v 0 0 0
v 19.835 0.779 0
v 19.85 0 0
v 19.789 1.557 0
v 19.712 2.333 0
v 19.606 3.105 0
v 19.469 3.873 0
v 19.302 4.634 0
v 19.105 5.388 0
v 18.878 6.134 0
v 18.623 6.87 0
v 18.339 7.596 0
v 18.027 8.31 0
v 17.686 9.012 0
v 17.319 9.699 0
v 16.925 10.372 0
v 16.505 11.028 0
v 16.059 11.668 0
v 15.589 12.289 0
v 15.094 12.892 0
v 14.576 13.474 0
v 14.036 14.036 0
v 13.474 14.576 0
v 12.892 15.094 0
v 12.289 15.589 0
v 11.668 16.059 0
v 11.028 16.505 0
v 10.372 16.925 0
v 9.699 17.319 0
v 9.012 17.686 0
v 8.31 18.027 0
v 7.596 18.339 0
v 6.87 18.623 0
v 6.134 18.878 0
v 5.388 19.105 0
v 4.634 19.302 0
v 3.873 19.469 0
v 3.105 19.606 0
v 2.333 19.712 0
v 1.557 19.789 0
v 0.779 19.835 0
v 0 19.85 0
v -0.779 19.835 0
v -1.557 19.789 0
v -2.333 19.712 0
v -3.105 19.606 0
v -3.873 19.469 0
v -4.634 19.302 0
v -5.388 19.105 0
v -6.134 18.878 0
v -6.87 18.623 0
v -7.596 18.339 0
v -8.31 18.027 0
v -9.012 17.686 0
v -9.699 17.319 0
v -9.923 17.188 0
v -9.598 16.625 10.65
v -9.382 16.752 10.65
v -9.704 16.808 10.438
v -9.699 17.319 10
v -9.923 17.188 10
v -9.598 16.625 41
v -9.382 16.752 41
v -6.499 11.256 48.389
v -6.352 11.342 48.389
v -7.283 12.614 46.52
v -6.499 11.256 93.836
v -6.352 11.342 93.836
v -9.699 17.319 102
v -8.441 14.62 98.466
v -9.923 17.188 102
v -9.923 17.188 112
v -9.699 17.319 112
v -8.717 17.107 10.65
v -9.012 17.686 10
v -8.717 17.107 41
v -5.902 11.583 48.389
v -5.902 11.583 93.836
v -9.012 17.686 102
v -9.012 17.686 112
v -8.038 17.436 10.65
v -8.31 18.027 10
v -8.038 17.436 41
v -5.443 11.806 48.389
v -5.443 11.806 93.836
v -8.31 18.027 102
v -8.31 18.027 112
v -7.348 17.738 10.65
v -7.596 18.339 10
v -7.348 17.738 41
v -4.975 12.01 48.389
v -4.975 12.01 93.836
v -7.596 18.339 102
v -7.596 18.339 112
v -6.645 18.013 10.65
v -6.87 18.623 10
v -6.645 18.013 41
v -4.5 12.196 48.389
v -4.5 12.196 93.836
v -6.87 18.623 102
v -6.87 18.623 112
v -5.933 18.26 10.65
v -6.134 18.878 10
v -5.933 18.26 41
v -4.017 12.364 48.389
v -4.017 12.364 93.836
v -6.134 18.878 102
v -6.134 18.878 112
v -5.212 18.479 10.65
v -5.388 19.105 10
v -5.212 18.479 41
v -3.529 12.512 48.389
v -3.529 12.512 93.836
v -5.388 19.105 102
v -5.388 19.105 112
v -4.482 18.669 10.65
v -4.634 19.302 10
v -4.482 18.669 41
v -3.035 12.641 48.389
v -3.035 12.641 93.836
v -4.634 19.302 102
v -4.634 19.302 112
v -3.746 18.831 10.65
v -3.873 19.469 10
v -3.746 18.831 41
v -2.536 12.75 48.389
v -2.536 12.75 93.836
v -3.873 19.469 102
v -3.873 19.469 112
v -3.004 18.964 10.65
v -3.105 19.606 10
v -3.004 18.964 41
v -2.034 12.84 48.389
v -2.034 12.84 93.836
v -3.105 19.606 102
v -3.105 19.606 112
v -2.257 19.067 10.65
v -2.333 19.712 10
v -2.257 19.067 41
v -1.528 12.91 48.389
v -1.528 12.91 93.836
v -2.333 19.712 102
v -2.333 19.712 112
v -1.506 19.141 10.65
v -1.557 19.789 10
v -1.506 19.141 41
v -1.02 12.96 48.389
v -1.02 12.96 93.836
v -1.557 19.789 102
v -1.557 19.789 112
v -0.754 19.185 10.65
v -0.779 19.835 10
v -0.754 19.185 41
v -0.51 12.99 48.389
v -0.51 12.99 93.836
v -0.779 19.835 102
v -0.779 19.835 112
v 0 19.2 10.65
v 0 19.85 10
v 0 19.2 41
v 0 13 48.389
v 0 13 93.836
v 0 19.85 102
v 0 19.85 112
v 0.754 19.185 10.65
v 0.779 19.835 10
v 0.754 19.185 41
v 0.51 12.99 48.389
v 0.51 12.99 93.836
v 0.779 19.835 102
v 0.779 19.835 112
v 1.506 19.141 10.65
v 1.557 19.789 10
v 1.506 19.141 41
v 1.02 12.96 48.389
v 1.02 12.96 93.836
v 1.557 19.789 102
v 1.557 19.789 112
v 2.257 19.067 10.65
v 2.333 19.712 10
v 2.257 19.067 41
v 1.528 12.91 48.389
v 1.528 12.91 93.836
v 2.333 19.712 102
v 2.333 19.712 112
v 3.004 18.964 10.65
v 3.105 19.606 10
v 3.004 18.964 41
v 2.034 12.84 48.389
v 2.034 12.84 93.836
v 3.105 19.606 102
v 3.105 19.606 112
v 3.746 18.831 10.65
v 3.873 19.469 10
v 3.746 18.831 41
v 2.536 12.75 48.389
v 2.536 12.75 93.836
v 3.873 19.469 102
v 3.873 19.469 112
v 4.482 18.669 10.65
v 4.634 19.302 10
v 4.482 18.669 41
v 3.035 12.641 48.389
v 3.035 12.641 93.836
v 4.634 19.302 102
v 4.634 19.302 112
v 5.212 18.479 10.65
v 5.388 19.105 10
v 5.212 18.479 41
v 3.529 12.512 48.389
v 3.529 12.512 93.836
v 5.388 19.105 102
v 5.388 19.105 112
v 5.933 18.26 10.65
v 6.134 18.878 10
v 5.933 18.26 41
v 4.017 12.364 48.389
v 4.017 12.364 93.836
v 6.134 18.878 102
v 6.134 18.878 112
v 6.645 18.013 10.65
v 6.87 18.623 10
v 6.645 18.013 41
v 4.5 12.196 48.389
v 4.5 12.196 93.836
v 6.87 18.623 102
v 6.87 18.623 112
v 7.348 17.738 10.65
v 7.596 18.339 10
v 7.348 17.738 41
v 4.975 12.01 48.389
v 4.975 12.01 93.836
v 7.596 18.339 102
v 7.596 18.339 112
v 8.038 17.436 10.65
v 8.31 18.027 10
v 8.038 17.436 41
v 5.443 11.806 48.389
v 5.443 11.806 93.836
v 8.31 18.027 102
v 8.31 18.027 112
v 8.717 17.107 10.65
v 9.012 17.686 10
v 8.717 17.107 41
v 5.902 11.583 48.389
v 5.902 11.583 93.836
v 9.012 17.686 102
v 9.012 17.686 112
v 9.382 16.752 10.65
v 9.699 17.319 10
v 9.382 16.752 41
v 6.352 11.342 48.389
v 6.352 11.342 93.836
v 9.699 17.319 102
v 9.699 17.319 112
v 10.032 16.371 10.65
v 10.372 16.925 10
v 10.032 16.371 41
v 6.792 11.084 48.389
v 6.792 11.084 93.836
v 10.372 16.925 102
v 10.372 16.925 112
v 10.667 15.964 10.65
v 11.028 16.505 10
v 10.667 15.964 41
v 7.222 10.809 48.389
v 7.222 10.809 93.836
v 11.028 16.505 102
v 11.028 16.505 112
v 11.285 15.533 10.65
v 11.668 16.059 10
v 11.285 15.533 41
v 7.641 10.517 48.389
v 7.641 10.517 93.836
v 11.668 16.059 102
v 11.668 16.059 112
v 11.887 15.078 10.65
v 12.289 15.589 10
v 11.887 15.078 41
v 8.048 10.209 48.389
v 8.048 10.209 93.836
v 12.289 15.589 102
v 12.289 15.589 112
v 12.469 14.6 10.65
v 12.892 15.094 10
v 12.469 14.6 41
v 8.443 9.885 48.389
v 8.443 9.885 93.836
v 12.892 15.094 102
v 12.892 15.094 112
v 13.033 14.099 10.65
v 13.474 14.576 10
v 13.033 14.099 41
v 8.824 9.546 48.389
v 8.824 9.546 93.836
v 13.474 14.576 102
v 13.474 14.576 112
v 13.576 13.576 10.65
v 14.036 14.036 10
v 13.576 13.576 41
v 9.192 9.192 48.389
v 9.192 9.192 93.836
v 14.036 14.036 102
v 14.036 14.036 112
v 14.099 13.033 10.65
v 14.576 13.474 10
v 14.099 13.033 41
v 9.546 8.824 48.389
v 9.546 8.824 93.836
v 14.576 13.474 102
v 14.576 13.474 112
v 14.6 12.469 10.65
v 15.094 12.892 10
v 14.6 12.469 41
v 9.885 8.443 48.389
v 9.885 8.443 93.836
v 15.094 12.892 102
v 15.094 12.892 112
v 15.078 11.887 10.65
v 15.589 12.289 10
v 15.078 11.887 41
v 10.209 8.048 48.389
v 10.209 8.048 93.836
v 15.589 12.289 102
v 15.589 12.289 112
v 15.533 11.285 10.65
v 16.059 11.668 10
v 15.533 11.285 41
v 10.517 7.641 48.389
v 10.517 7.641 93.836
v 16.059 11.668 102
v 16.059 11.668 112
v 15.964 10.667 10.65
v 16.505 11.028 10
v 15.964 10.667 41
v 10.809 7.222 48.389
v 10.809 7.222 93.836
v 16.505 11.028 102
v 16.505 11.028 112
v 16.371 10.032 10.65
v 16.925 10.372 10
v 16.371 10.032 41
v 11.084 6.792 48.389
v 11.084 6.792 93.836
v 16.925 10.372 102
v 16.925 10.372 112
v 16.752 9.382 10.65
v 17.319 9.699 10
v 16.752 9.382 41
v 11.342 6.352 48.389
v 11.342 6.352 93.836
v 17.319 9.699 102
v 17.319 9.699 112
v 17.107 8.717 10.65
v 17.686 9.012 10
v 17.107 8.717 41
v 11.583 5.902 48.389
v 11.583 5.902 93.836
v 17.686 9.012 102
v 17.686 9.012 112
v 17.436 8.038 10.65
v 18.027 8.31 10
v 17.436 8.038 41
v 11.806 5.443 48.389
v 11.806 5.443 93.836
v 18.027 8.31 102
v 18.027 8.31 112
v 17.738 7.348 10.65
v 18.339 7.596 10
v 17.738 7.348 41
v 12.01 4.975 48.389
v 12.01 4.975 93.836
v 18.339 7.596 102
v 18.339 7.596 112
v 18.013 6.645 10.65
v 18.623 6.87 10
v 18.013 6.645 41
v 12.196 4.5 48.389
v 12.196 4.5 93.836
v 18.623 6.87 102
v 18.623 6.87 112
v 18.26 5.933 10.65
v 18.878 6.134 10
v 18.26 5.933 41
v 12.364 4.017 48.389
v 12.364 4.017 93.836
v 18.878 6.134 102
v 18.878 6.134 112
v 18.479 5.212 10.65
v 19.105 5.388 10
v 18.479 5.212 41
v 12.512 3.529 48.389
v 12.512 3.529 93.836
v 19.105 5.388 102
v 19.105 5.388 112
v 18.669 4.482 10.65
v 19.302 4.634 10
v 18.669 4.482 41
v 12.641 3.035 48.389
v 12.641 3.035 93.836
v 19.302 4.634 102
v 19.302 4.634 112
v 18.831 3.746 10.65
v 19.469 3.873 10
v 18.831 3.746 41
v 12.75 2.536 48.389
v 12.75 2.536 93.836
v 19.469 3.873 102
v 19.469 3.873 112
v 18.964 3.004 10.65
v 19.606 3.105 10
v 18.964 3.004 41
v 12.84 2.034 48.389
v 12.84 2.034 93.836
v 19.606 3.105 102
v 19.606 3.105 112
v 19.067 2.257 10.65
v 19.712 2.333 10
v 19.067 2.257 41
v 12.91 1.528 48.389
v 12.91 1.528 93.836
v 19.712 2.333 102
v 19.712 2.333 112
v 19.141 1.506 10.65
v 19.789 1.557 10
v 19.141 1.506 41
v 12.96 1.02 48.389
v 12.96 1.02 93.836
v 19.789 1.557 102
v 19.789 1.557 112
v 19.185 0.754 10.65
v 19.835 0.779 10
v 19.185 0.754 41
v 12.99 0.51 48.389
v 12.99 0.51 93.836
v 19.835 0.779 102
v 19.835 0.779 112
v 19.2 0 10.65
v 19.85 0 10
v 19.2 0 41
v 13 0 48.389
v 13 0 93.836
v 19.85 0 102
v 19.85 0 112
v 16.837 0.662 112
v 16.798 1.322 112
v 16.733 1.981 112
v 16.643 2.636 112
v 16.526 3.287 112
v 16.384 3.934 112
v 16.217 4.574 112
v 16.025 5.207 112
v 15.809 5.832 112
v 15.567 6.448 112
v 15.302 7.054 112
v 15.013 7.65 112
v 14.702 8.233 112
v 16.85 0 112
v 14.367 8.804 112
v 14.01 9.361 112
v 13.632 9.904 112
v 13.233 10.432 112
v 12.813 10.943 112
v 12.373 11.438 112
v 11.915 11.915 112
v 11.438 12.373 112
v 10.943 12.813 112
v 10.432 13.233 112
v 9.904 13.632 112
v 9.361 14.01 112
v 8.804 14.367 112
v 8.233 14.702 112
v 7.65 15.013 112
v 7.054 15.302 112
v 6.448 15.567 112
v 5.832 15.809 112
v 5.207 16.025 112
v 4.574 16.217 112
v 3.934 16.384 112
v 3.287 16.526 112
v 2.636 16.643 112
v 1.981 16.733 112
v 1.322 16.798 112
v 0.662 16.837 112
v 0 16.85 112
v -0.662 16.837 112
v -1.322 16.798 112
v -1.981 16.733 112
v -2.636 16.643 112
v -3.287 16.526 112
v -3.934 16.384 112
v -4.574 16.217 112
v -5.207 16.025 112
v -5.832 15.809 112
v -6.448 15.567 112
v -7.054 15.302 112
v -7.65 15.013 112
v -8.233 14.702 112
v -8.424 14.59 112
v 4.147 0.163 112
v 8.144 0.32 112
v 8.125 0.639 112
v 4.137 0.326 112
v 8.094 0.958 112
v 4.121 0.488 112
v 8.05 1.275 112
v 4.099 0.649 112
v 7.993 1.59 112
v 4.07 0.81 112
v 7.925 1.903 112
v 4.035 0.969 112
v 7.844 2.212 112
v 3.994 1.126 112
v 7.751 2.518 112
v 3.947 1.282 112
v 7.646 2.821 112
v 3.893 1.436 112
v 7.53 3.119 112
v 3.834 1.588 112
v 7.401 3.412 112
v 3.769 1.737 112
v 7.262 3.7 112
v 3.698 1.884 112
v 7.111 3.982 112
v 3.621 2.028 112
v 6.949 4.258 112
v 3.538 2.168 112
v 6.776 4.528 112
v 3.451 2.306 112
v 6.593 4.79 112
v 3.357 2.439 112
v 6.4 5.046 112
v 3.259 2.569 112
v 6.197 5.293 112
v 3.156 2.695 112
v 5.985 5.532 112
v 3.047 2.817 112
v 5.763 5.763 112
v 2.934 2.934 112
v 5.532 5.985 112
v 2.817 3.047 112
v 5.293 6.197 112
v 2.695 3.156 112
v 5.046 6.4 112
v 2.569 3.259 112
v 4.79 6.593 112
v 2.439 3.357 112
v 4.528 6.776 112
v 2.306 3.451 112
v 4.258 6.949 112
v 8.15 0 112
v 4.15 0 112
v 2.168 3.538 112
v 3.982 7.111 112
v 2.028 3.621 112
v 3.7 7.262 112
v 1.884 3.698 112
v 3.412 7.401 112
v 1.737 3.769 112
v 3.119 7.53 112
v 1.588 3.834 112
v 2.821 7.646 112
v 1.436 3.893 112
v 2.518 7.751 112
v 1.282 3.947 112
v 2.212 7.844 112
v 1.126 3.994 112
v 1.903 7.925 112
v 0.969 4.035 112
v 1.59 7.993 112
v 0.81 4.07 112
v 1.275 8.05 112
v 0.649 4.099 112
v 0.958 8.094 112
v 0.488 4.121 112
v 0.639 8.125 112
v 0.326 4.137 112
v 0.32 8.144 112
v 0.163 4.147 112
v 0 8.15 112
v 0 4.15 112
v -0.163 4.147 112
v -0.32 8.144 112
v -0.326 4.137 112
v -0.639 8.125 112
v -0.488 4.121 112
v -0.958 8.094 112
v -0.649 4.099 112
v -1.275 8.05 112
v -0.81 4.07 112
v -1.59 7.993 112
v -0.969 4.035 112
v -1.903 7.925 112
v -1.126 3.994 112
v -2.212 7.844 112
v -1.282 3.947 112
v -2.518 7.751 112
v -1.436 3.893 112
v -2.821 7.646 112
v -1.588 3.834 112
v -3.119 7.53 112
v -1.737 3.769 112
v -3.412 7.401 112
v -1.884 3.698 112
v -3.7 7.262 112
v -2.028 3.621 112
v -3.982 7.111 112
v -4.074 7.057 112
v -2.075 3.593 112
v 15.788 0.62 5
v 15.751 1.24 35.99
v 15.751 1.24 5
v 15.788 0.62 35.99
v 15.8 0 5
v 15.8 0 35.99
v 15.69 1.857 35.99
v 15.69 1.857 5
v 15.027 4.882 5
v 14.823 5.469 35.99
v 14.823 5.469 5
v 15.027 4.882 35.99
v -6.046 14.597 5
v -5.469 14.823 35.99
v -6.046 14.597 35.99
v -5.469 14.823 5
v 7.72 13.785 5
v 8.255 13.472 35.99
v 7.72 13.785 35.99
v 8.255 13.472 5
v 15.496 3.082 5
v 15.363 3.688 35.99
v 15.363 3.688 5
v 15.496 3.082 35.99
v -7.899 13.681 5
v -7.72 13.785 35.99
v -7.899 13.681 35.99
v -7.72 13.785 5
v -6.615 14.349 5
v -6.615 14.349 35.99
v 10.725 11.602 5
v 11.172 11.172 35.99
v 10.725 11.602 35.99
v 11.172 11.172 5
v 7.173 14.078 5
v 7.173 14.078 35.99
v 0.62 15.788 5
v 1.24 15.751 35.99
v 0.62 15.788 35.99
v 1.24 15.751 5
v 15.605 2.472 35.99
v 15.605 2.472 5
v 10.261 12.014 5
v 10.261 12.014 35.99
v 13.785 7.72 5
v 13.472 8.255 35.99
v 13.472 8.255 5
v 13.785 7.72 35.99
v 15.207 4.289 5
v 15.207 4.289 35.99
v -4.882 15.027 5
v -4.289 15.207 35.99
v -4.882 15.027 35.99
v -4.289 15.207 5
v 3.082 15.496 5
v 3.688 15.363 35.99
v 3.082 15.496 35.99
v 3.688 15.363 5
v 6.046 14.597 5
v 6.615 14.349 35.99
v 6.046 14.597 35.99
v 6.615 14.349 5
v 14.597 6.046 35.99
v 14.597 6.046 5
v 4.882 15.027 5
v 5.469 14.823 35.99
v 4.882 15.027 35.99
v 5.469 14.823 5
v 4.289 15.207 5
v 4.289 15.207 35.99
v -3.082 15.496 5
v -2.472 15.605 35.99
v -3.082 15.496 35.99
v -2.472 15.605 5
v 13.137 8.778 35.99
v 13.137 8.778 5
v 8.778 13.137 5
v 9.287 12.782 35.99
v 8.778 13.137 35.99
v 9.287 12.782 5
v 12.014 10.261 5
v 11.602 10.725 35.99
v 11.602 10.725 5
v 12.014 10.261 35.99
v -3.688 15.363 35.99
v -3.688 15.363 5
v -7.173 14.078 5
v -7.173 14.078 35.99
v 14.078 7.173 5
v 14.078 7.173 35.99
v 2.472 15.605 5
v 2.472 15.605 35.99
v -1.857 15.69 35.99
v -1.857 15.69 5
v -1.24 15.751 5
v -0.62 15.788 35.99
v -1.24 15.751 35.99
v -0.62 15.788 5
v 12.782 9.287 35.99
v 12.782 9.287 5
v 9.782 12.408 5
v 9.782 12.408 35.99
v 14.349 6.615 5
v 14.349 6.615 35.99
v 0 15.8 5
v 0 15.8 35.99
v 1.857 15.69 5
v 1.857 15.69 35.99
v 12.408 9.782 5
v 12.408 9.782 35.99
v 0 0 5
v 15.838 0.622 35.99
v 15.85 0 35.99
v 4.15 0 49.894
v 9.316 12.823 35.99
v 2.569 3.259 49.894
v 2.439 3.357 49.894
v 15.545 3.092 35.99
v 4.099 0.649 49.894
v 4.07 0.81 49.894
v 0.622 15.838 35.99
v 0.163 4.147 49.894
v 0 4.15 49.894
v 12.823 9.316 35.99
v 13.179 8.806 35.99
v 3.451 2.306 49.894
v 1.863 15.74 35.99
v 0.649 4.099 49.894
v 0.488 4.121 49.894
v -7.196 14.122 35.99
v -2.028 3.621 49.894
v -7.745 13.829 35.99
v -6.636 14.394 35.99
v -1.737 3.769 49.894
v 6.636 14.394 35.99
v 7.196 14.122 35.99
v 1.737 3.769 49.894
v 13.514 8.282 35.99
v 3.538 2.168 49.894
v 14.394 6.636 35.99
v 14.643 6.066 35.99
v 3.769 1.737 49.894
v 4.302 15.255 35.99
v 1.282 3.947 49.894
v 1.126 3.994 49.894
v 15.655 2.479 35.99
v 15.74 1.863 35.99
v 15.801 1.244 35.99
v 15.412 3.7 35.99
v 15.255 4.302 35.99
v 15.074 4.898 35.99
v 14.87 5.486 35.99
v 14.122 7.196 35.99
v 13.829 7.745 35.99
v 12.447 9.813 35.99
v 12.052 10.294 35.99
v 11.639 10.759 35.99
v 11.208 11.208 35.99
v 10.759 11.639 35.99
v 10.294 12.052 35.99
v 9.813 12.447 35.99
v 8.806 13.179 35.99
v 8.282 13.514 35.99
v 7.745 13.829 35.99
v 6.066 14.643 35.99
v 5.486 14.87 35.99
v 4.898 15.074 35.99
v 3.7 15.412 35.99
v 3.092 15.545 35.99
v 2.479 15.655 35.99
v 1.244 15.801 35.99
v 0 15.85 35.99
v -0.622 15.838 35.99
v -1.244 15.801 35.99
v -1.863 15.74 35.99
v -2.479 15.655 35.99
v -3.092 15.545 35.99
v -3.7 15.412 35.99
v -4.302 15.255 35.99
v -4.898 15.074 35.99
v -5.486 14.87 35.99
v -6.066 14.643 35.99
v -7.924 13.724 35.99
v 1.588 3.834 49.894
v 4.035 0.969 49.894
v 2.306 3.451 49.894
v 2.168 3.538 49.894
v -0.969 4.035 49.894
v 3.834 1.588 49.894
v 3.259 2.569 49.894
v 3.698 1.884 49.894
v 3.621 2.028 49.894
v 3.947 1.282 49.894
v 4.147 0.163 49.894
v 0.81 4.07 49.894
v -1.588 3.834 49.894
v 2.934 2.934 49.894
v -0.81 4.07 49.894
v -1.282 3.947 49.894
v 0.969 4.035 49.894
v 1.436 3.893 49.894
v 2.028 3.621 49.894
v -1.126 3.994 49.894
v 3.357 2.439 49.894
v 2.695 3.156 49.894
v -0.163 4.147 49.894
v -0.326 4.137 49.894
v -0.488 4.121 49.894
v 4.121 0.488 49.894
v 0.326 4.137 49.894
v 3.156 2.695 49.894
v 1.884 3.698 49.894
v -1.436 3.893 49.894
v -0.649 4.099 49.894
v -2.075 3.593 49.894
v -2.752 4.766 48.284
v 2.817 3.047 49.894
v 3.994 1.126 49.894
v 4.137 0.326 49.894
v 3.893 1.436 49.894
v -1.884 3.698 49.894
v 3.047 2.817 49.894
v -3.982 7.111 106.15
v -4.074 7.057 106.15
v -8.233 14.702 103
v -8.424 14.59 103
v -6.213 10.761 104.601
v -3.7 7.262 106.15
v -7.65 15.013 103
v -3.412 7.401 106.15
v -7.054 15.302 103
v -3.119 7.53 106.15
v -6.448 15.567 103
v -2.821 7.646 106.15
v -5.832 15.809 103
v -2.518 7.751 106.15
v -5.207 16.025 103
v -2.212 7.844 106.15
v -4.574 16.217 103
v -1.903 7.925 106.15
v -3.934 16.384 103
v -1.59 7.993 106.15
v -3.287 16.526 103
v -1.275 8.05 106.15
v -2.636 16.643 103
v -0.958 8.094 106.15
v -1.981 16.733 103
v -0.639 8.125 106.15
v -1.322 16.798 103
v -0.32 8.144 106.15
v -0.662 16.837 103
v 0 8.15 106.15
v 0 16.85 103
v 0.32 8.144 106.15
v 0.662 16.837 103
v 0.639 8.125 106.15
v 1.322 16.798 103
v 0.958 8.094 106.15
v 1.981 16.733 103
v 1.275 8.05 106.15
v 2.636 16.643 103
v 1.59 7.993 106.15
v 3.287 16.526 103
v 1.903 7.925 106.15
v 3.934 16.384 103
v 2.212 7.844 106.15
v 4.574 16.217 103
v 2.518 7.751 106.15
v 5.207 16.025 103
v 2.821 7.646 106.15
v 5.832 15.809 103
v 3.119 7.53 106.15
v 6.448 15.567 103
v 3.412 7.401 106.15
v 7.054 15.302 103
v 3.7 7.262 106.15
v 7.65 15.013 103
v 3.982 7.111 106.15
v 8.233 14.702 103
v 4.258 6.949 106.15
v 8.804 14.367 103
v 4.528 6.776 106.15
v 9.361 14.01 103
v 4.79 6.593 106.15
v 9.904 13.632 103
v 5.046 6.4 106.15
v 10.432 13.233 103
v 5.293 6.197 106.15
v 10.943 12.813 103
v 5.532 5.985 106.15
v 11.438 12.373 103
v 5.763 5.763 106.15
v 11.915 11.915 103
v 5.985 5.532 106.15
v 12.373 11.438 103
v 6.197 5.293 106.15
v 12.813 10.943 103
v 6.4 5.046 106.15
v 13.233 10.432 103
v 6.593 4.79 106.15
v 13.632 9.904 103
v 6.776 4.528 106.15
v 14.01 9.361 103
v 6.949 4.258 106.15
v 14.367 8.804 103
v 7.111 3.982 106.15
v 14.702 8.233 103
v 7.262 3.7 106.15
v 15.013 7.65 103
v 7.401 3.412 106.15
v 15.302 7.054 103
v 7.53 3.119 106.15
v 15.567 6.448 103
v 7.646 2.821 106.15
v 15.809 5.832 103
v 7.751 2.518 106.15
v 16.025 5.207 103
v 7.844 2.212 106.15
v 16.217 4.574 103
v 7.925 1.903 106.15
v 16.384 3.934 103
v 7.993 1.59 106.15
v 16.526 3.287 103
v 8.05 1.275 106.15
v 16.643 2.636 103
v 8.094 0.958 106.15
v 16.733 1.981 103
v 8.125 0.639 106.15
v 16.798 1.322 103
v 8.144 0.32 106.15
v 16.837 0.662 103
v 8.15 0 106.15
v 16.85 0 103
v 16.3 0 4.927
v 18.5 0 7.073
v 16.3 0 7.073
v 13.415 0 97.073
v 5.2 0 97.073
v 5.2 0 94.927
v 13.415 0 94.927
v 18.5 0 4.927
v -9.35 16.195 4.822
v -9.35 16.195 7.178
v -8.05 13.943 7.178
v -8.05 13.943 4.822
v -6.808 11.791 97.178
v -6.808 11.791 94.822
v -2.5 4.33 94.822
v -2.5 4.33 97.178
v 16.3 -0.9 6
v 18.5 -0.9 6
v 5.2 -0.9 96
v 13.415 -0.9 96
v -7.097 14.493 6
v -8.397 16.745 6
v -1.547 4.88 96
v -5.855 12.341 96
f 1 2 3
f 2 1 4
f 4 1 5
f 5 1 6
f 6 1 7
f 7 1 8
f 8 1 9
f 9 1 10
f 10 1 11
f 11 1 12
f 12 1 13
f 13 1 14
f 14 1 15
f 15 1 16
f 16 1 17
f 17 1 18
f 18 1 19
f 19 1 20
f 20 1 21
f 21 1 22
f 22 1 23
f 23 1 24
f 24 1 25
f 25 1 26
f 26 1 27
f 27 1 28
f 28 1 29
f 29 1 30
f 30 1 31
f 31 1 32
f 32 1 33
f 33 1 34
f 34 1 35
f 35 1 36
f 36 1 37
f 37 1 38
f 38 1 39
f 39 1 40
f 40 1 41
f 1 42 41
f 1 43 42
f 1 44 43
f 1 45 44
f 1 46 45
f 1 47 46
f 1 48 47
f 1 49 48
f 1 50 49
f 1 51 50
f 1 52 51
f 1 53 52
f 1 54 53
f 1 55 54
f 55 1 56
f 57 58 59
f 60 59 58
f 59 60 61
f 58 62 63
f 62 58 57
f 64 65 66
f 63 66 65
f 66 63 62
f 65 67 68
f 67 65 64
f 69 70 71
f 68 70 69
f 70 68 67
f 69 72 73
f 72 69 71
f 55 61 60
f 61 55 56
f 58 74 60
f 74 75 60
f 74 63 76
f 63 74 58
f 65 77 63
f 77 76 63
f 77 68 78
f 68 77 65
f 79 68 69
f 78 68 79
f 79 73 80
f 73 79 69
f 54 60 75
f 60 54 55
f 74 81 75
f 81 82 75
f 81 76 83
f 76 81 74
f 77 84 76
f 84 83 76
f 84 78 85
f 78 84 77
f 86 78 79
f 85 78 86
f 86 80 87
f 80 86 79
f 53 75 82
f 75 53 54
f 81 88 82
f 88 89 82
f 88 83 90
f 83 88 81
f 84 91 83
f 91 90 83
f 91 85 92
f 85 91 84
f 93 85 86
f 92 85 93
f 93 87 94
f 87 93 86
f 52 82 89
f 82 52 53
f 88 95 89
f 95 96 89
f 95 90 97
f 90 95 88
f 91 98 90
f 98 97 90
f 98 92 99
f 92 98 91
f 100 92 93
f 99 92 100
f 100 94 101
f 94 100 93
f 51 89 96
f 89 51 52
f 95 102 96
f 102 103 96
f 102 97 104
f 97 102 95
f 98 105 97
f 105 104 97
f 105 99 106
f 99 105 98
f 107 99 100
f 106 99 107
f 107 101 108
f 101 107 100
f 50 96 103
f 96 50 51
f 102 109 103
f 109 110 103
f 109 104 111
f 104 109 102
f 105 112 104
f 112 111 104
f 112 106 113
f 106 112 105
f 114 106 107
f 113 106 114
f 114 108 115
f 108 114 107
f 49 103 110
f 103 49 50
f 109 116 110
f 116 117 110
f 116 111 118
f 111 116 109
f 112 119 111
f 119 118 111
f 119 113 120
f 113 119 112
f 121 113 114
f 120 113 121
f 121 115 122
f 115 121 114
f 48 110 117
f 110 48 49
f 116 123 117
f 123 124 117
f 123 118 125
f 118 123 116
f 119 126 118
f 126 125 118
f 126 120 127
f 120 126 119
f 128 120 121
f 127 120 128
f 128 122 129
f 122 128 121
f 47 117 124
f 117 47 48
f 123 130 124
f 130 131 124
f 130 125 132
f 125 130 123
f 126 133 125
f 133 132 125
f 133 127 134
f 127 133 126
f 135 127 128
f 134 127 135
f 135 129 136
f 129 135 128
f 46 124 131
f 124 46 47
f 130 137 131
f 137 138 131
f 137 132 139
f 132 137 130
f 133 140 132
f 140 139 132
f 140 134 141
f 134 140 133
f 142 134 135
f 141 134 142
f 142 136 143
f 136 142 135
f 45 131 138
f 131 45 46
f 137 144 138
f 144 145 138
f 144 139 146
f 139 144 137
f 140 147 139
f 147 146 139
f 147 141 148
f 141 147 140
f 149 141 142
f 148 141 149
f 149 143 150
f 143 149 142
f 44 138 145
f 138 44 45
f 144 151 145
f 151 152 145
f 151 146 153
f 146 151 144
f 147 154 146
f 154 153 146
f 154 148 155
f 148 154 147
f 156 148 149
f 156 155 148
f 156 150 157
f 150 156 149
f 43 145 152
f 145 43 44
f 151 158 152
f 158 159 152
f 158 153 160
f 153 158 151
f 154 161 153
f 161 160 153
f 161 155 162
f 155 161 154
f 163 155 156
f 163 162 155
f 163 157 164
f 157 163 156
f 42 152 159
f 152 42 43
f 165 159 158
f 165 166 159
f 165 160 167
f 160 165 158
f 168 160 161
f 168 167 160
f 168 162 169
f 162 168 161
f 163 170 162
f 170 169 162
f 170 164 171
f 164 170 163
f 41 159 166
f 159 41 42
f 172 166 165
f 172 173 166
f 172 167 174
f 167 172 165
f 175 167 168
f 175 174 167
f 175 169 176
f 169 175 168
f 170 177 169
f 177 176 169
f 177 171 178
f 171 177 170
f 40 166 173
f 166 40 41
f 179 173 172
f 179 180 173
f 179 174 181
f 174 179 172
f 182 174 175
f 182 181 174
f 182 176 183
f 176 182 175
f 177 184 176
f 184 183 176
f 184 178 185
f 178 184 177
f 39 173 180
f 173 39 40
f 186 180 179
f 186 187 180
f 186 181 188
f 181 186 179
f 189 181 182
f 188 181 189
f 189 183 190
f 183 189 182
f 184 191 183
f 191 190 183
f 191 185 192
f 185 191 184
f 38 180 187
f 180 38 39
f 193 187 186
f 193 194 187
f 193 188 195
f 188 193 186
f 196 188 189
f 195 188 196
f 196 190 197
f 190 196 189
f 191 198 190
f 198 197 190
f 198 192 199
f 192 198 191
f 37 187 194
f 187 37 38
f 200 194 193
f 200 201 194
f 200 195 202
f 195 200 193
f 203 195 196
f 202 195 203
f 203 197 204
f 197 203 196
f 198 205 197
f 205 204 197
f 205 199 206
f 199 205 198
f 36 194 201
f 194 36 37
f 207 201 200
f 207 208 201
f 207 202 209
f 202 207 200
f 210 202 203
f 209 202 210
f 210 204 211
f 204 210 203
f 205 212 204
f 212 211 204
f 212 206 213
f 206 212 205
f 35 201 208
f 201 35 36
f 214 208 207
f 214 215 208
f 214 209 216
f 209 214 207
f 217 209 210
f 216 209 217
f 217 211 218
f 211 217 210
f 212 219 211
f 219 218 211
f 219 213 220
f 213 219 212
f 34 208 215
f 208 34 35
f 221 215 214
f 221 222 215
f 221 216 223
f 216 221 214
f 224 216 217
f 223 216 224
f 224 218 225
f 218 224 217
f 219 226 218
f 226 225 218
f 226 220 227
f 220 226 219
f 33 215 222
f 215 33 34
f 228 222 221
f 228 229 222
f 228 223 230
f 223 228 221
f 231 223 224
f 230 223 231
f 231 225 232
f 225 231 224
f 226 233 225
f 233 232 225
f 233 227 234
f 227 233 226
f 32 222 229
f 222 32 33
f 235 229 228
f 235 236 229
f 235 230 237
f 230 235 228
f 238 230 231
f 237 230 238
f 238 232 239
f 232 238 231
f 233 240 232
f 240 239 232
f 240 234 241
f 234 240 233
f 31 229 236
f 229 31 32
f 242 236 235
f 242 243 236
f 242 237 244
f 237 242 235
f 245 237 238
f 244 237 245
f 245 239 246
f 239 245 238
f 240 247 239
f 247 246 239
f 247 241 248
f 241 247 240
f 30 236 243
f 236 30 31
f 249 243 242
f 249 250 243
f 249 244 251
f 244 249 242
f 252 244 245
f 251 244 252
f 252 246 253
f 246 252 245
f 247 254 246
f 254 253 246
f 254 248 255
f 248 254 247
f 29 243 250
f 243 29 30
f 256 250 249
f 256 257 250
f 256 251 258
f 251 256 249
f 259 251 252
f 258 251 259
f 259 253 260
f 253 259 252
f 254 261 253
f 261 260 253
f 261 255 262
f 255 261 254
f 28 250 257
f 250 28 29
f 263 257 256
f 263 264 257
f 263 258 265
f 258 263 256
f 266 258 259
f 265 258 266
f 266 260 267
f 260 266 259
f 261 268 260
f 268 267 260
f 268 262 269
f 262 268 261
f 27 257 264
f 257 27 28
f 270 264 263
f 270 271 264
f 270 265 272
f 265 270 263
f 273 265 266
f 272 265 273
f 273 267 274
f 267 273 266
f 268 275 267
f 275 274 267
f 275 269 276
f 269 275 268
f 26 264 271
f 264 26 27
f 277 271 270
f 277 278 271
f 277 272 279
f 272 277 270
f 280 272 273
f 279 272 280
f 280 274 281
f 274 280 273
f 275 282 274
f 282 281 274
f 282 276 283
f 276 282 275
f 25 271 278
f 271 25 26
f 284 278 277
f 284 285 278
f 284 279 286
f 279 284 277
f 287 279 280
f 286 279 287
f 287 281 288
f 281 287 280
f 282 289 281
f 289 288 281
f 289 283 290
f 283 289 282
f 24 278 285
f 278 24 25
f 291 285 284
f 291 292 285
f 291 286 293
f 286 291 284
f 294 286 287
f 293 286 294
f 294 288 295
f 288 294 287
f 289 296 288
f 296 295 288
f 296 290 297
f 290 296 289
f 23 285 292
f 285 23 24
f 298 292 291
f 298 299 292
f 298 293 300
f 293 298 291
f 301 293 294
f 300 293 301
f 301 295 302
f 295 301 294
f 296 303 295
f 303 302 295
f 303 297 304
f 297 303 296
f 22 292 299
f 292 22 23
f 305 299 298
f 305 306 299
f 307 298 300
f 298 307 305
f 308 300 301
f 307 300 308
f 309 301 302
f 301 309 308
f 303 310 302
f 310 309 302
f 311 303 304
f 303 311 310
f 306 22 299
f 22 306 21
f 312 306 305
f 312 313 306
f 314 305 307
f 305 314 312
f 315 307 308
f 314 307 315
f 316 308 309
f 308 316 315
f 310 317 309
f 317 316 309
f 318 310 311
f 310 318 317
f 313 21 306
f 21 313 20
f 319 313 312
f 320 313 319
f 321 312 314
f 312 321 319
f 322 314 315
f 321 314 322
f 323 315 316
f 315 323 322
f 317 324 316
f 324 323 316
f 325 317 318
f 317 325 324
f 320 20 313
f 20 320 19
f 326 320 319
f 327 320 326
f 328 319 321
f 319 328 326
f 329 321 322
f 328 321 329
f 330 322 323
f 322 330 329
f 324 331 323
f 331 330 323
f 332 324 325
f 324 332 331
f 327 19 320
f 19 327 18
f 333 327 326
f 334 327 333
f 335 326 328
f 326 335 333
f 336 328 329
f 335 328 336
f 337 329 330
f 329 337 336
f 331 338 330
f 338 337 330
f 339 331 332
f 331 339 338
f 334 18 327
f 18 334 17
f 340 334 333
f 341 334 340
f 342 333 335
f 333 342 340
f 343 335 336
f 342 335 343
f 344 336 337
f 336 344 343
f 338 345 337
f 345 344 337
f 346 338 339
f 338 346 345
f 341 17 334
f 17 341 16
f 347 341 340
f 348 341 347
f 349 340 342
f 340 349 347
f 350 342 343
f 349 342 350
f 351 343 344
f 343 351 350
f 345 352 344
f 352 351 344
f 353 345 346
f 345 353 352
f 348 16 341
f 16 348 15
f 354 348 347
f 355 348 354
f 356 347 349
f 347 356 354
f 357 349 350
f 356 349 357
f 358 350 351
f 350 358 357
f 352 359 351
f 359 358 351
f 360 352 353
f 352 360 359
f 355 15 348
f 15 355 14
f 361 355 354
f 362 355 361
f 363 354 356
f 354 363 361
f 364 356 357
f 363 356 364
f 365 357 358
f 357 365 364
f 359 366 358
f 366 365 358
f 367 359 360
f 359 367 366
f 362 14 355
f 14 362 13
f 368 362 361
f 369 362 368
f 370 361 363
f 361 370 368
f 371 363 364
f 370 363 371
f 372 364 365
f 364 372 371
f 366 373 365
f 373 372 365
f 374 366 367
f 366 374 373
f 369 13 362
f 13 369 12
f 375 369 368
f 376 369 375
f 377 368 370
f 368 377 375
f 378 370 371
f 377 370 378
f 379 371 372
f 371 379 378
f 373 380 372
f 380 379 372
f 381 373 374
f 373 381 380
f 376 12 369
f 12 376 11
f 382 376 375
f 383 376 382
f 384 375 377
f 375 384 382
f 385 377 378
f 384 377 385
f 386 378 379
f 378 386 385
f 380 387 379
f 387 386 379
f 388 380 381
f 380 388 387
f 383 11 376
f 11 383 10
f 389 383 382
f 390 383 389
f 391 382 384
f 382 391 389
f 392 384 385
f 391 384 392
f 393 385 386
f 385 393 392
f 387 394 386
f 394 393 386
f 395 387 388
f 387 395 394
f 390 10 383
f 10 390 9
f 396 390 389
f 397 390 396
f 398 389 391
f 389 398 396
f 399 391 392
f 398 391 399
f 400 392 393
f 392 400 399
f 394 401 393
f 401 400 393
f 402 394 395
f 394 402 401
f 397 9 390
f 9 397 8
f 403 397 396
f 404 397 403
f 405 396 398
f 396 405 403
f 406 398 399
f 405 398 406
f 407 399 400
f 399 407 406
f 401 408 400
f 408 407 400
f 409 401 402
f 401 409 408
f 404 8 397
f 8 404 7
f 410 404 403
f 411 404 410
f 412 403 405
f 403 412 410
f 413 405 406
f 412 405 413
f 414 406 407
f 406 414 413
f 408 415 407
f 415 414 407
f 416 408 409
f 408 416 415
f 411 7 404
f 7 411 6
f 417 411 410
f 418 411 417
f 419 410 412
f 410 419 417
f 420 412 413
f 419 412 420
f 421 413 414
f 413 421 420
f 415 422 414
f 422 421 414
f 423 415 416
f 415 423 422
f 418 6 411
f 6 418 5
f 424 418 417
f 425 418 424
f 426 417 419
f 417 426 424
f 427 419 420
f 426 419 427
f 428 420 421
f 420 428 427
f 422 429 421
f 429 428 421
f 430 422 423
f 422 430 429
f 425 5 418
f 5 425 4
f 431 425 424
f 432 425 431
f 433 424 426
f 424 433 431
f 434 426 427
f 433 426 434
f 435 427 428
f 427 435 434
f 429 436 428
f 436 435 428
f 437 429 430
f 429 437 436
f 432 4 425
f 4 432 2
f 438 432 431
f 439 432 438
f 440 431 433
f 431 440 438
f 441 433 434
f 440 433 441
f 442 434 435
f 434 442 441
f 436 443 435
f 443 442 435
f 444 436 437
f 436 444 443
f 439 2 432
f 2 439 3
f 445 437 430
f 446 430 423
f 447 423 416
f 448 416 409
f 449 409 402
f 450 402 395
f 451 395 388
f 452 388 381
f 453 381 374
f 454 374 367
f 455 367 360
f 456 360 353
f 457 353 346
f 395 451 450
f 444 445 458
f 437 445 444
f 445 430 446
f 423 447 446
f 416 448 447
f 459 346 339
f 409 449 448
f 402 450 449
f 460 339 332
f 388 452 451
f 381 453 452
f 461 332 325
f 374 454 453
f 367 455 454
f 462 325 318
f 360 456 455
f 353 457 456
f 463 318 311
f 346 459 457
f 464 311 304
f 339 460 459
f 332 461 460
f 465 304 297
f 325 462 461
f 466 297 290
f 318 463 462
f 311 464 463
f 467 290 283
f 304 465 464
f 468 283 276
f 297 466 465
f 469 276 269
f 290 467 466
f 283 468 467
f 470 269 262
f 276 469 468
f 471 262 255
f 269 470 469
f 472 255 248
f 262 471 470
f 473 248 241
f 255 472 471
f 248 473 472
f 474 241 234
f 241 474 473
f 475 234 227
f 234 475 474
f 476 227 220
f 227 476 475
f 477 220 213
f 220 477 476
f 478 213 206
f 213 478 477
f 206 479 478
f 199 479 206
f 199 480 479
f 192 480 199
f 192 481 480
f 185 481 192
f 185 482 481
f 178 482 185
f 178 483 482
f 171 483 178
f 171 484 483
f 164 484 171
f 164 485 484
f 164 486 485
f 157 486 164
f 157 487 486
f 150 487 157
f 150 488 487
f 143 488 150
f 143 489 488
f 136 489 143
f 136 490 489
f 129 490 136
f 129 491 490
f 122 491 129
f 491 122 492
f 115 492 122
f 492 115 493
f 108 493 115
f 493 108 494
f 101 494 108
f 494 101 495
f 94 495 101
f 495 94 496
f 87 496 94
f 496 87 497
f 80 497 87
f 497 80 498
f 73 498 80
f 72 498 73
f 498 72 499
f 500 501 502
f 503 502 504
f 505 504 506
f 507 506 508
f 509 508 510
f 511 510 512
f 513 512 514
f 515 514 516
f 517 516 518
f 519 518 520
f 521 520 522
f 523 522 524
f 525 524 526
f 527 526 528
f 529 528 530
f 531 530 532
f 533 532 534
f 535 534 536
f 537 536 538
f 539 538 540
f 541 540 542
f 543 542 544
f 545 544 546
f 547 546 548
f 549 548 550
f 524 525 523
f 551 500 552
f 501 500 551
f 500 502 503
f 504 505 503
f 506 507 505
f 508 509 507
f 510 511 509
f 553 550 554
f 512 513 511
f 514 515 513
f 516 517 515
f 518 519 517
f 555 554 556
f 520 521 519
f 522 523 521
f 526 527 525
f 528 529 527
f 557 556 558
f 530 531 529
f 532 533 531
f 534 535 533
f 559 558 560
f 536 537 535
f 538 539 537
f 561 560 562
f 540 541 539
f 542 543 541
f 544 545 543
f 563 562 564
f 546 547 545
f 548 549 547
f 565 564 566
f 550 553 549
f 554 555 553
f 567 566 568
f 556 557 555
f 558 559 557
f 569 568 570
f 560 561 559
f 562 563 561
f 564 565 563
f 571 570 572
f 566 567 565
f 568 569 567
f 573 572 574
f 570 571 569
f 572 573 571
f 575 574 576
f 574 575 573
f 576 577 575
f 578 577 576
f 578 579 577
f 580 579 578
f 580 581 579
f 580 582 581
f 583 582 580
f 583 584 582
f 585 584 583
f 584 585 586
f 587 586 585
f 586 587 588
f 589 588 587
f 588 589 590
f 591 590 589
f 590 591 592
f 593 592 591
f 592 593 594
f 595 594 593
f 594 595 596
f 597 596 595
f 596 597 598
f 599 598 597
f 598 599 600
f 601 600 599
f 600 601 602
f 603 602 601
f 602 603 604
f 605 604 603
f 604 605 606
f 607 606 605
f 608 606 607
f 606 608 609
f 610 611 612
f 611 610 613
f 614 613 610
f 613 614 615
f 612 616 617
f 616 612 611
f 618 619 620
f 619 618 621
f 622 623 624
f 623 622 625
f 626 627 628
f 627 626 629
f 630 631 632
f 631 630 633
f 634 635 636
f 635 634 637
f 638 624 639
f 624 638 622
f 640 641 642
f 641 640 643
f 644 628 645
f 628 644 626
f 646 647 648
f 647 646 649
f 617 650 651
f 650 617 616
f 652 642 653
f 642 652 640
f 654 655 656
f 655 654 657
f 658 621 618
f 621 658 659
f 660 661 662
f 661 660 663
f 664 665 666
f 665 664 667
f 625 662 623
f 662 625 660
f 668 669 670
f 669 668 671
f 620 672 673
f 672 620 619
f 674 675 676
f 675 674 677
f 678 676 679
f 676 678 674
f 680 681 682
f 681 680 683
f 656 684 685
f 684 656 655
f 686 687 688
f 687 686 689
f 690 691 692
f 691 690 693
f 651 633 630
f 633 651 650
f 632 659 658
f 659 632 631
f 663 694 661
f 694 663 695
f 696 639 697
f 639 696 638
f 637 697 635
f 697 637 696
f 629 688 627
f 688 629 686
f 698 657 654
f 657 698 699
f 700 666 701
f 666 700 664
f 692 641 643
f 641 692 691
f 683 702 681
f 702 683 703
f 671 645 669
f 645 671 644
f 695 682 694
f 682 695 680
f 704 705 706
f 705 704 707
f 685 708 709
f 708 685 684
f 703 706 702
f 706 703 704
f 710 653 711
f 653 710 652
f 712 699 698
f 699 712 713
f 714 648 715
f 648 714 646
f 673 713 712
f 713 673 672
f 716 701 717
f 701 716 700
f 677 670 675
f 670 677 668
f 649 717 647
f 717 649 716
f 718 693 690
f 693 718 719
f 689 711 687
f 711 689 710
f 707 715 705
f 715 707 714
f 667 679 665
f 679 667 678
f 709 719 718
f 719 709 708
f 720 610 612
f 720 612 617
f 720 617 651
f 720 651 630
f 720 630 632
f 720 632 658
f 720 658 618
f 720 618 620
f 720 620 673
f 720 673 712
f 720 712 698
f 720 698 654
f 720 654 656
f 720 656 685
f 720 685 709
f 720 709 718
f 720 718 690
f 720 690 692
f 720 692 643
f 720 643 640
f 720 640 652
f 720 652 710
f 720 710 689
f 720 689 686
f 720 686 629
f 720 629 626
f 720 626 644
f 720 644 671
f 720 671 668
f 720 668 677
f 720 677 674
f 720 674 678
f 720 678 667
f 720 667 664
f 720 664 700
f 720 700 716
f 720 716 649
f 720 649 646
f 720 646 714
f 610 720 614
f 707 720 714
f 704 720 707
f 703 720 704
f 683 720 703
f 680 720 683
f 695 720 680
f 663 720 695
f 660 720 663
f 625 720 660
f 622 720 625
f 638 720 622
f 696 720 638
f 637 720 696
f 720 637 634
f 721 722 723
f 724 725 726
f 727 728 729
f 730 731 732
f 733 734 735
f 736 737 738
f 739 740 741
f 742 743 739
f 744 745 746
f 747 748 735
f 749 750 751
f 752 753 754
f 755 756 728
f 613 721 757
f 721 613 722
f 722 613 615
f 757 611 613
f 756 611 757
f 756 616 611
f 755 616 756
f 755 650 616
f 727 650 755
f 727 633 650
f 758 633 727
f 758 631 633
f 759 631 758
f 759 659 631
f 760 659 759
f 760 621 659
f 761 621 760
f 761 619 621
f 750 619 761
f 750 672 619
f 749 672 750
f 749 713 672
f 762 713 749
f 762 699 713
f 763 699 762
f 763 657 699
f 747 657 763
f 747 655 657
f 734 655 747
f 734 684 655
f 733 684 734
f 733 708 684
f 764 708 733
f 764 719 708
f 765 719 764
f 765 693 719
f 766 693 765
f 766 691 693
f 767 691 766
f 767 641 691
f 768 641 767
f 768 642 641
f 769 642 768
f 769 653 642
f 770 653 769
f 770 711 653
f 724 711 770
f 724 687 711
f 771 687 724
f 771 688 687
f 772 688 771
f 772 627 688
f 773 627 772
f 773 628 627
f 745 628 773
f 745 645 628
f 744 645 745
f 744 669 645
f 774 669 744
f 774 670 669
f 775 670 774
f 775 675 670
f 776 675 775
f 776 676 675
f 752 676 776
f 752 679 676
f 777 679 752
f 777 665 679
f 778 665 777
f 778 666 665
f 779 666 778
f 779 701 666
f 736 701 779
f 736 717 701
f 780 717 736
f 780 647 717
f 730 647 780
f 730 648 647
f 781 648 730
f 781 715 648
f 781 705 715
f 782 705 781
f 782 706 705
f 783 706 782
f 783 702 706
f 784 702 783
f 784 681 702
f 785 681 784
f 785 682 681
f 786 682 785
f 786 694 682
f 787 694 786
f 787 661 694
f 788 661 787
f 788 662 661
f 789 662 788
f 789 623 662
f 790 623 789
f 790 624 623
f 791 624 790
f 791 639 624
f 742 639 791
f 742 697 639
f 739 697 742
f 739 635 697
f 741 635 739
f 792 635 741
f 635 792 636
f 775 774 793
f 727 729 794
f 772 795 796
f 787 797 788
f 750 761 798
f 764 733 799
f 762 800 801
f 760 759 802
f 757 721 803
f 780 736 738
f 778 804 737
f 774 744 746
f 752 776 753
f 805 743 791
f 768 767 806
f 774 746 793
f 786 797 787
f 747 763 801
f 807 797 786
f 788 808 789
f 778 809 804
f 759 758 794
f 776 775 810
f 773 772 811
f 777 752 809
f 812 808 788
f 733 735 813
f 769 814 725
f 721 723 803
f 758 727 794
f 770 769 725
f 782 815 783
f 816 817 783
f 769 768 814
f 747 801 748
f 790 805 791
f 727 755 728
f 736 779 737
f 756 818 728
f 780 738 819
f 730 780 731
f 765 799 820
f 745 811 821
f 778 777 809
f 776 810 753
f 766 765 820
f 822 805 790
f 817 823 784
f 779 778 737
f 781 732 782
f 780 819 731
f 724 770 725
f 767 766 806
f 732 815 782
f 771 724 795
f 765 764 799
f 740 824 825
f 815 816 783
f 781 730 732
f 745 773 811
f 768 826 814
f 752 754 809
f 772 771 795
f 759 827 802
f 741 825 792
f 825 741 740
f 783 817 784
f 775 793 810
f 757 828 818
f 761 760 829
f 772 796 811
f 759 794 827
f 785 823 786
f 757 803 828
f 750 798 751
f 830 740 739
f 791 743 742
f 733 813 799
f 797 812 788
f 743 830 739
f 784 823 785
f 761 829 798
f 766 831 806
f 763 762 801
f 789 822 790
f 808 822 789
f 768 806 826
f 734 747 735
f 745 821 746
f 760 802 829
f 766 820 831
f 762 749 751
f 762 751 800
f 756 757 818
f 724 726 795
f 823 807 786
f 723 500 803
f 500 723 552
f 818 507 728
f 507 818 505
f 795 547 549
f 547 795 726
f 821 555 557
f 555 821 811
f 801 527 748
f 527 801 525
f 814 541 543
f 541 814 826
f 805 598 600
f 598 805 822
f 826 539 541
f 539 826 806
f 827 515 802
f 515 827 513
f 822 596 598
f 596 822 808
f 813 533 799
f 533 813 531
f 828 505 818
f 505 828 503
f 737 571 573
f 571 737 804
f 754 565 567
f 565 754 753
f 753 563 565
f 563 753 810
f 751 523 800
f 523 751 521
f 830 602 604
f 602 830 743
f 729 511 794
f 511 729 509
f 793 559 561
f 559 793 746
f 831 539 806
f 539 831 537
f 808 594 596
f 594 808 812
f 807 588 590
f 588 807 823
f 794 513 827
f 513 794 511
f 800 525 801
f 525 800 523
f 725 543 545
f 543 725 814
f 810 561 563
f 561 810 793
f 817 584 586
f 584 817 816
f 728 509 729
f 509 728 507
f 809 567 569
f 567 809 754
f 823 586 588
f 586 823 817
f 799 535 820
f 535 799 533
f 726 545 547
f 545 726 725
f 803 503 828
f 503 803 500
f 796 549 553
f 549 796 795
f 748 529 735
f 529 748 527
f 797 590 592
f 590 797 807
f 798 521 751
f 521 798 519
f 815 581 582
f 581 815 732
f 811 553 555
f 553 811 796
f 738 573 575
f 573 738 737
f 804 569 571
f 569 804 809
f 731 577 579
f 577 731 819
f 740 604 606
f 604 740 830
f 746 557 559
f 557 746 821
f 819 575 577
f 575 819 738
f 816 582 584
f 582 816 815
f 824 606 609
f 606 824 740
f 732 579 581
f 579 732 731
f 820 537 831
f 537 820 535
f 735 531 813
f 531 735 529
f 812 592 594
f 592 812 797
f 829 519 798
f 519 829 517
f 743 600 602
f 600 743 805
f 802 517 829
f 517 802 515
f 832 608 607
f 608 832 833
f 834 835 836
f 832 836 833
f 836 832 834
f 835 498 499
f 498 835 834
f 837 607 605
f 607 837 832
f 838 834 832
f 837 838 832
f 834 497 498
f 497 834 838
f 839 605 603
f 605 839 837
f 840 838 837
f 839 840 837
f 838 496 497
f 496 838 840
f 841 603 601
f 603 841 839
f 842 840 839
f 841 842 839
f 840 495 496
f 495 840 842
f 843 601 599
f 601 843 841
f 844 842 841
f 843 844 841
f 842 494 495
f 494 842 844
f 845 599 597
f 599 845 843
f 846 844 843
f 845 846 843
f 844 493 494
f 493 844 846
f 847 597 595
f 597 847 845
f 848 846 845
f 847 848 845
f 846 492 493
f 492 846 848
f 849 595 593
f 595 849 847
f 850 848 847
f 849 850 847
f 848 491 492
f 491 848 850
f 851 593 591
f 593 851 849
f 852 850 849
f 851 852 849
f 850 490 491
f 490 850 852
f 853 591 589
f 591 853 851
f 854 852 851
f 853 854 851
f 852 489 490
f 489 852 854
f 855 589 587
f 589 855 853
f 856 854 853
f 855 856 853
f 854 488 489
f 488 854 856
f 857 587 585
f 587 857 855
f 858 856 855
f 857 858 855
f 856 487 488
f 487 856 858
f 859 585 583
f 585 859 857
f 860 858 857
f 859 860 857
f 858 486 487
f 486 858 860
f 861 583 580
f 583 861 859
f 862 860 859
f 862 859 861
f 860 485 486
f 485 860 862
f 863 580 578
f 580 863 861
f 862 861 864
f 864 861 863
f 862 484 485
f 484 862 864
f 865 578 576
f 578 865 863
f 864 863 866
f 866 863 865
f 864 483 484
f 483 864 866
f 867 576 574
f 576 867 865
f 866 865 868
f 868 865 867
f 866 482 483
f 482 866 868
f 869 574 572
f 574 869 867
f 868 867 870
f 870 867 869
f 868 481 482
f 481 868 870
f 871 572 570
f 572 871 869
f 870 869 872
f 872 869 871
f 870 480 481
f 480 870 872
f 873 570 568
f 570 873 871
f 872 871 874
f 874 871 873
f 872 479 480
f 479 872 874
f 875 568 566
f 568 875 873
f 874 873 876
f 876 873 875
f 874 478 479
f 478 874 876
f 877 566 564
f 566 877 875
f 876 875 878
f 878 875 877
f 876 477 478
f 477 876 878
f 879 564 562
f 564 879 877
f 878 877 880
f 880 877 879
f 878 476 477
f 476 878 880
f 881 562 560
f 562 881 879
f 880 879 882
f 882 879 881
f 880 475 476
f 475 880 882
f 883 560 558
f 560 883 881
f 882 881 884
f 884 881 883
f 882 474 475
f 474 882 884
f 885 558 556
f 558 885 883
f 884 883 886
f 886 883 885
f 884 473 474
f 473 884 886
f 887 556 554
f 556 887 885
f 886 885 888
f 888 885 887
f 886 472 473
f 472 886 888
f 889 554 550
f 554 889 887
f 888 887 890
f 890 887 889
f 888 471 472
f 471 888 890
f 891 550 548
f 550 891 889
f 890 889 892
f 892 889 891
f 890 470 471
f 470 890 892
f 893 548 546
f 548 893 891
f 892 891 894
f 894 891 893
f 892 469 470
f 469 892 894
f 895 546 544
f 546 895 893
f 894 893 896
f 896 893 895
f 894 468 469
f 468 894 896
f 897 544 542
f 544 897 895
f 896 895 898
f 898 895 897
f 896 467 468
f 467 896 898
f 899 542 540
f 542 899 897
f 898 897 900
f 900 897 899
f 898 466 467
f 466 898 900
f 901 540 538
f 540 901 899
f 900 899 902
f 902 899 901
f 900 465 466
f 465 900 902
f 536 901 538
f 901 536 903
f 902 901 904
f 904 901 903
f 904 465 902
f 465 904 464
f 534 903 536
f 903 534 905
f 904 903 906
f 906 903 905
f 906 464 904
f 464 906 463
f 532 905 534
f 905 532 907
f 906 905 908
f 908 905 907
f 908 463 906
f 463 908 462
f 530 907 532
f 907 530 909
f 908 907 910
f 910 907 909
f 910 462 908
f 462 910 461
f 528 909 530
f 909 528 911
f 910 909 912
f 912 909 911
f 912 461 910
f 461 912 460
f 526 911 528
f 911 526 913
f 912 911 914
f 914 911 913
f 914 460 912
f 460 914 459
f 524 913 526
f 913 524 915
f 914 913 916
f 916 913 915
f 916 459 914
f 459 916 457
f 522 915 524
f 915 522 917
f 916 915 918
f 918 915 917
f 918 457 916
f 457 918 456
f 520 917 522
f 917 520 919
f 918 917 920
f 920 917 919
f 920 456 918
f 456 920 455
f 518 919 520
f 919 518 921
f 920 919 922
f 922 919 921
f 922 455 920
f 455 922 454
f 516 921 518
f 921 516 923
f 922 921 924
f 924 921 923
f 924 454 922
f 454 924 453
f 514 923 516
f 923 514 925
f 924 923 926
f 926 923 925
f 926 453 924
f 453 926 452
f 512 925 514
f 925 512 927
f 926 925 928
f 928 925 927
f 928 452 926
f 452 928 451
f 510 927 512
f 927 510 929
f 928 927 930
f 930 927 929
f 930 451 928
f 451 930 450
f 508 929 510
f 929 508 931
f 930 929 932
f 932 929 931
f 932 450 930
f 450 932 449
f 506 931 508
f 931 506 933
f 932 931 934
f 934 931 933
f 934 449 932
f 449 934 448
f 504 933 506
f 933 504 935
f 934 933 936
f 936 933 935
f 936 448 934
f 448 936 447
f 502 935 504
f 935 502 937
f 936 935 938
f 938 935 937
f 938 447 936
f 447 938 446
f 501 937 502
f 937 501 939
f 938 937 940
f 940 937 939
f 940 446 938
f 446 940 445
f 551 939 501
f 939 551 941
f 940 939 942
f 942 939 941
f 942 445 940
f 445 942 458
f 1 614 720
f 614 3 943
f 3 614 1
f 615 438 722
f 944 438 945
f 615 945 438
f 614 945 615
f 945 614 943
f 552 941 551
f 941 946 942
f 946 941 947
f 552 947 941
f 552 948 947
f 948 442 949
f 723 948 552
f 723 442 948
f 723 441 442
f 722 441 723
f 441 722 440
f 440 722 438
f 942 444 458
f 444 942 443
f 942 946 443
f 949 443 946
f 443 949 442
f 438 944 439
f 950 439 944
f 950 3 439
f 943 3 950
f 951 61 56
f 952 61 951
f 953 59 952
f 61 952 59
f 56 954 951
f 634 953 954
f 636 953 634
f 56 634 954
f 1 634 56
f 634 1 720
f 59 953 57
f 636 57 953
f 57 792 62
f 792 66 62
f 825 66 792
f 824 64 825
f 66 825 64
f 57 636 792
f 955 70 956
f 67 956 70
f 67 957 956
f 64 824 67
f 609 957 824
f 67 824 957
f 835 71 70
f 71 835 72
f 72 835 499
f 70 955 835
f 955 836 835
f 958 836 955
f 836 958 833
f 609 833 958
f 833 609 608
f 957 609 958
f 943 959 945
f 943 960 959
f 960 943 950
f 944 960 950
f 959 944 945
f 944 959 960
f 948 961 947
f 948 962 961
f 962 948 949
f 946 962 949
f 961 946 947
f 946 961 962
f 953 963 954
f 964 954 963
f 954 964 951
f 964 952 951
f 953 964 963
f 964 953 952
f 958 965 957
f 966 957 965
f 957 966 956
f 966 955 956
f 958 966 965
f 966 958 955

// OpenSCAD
// file: flechette_dims.scad
// Shared flechette dimensions, used by flechette_parts.scad and sabot.scad.
// Every rod-carrying design comes in two rod sizes (Russ's rule):
//   rod_d = 8     8 mm hardened linear rod, or 5/16 in. (7.94 mm) Home Depot
//                 plain steel rod: both fit the same parts
//   rod_d = 12.7  1/2 in. rod (Home Depot plain steel, or a 1/2 in. linear shaft).
//                 A metric 12 mm rod would be loose in these: rebuild with rod_d = 12.
// Build either size with:  openscad -D rod_d=12.7 ...
// The 8 mm numbers are unchanged from the first design.

rod_d       = 8.0;
big         = rod_d > 10;
rod_len     = 150.0;

// push-on sockets (rev 2, no crush ribs: Russ found PCTG ribs don't crush, so
// the tails wouldn't go on, while the noses were a bit loose):
//   a plain round grip section, 12-14 mm long, sized for a snug press fit,
//   a slightly looser bore elsewhere, and a lead-in chamfer at the tail mouth.
// grip_d is the number to tune: use the socket fit gauge (socket_fit_gauge.scad)
// to find the hole that feels right on your rods, then set grip_fit to it.
sock_d      = rod_d + 0.2;          // reference size for the hub wall
grip_fit    = 0.00;                 // grip bore = rod + this. Russ's fit gauge: the +0.00 hole fit best (8 mm rod)
grip_d      = rod_d + grip_fit;
clear_d     = rod_d + 0.25;         // non-gripping parts of the bore: slides freely
grip_len    = 12.0;                 // tail: gripping length at the mouth
lead_in     = 0.6;                  // 45 deg chamfer at the tail mouth
wall        = big ? 2.0 : 1.7;      // socket wall (thicker for the 3x heavier rod)
hub_d       = sock_d + 2 * wall;    // 11.6 / 16.9 mm

// noses
nose_sock   = big ? 18.0 : 14.0;    // socket depth
spike_len   = big ? 40.0 : 30.0;    // shaped tip length above the sleeve
ogive_len   = big ? 26.0 : 18.0;    // rev 2: shorter, more bullet-shaped (about 1.5 hub diameters; was 32 / 24)
ogive_tip_r = big ? 3.4 : 2.4;      // rev 2: rounder tip, ~40% of the hub radius (was 2.3 / 1.6)
nose_gap    = 12.7;                 // rod end sits this far below the nose tip (Russ: about 1/2 in.),
                                    // unless that would leave less than 1.5 mm of wall (the 1/2 in. rod)
nose_taper  = big ? 18.0 : 20.0;    // tapered tail behind the sleeve, down toward the rod (1/2 in.: sabot clearance limits it)
taper_end_r = sock_d / 2 + 1.0;     // 1 mm wall at the taper's end (no feather edge)

// tails
tail_sock   = big ? 30.0 : 26.0;
tail_floor  = 3.0;
fin_n       = big ? 6 : 4;          // 1/2 in. rod needs 6 fins to stay stable (span is capped by the sabot)
fin_span    = 30.0;                 // tip to tip, fits the sabot cavity
fin_t       = 1.8;
fin_root    = big ? 36.0 : 30.0;
fin_tip     = big ? 16.0 : 13.0;
fin_cant    = 2.0;
basket_d    = 30.0;
basket_len  = 30.0;
basket_wall = 1.6;
windows     = 8;
window_h    = 11.8;                 // diamond height (pointed top prints without supports)
window_w    = 4.5;                  // diamond width: leaves ~3 mm bridges between windows (was 7.35, ~0.1 mm)
basket_twist = 16;

// overall tail length (sabot cavity must hold it)
tail_len    = max(tail_floor + tail_sock, fin_root, basket_len);

T50 = tan(50);
// main file
// Sabot for the 150 mm steel flechette (rod + printed nose + tail), 8 mm or
// 1/2 in. rod: set rod_d (see flechette_dims.scad), e.g. -D rod_d=12.7.
//
// Three identical petals close around the flechette and fill the 38 mm
// barrel. Air pushes the base; the base pushes the tail; the tail's floor
// pushes the rod. At the muzzle the petals fall away and the flechette
// flies on alone.
//
// Shape (after the military sabots Russ found):
//   - rear band: full 38 mm, rides and seals in the barrel (touch point 1)
//   - hollow rear cavity that holds the tail fins (30 mm span)
//   - slim waist (saves weight: every gram of sabot is wasted energy)
//   - front band: full 38 mm (touch point 2, ~95 mm from the rear band)
//   - front scoop: an open ring-shaped cup. Leaving the muzzle, oncoming air
//     fills it and pushes the three petals outward and back, evenly, so the
//     flechette isn't knocked off line.
// Alignment keys: each petal has a V ridge on one side face that drops into
// a V groove on its neighbor (one near the rear band, one at the front
// flare). The ridges run outward from the centre, so they stop the petals
// sliding lengthwise or twisting against each other but let them pull
// straight apart at the muzzle. Their faces slope 50 deg, so they print fine.
// The barrel holds the petals together while firing. To load, pinch them
// around the rod at the waist; once the first band is in, the barrel holds them. Fire it with a wad behind it to seal
// the petal seams.
//
// Print 3 petals (part = "petal"), each standing on its rear face, supports
// off, 100% infill or 6+ walls. Every downward face is >= 50 deg.

$fn = 160;

part        = "petal";      // "petal", "all" (3 petals, closed), "assembly", "open"
// The two bearing bands are sized to Russ's barrel (about 39 mm inside), not
// the 38.0 mm projectile limit, so the barrel squeezes the petals closed and
// centered. Only the bands touch the barrel; Russ approved this exception.
band_d      = 39.7;         // Russ: barrel measured ~40.1 mm inside (caliper); petals close to 39.7 mm
max_width   = 40.0;
D           = band_d;
n_petals    = 3;

include <flechette_dims.scad>     // rod size (rod_d) and tail/nose sizes, shared with the parts

// sabot
base_t      = 5.0;          // base the tail sits on (thick: it takes the air blast and the tail's push)
rear_band   = 10.0;         // length of the rear bearing band
fin_clr     = 0.8;          // clearance around the fins
bore_clr    = 0.15;         // rod bore clearance (rod slides out freely)
cav_wall    = 3.4;          // wall around the tail cavity (rev 3: was 2.4, Russ snapped one bending it)
// Rev 2 (Russ's first print snapped every petal at the bottom of the waist
// at ~90%: each petal's waist was a 3.35 mm sliver, down to ~1.6 mm where it
// met the cavity roof, standing 112 mm tall). Now a thick waist.
waist_r     = max(13.0, rod_d / 2 + bore_clr + 7.0);   // 13.0 (8 mm rod) / 13.5 (1/2 in.)
front_top   = 112.0;        // front end of the sabot (rod's front 40+ mm and nose stick out)
front_band  = 10.0;
scoop_depth = 9.0;
scoop_in_r  = rod_d / 2 + bore_clr + 4.0;    // collar around the rod (8.15 / 10.5)
scoop_wall  = 3.0;
key_d       = 0.9;          // how far a ridge sticks out of the face
key_h       = key_d * tan(50);   // half-height (faces at 50 deg)
key_clr     = 0.2;
assert(D <= max_width);
R  = D / 2;
fc_r   = fin_span / 2 + fin_clr;                 // fin cavity radius
cav_top = base_t + tail_len + 1.0;               // top of the straight fin cavity
bore_r = rod_d / 2 + bore_clr;
cone_top = cav_top + (fc_r - bore_r) * T50;      // cavity roof cone (50 deg) down to the rod bore
mid_r  = fc_r + cav_wall;                        // outer radius around the fin cavity
taper_delay = 5.0;                               // outer taper starts this far above the cavity top, so the wall
                                                 // over the cavity's 50 deg roof is ~6.6 mm instead of 2.4
waist0 = cav_top + taper_delay + (mid_r - waist_r) * T50;   // outer cone reaches the waist here
band0  = front_top - front_band;
flare0 = band0 - (R - waist_r) * T50;            // front flare (widens upward at 50 deg)

assert(flare0 > waist0 + 5, "waist too short");
og_rho_s   = (pow(hub_d / 2, 2) + ogive_len * ogive_len) / hub_d;
og_h_rod_s = max(0, min(ogive_len - 0.6 * ogive_tip_r - nose_gap, sqrt(og_rho_s * og_rho_s - pow(og_rho_s - hub_d / 2 + grip_d / 2 + 1.5, 2))));
assert(front_top < base_t + tail_floor + rod_len - nose_sock - nose_taper - og_h_rod_s - 2, "sabot would reach the nose");
key_z2      = 96.0;
keys        = [[6.0, 16.3, 18.5], [key_z2, rod_d / 2 + bore_clr + 1.05, waist_r + (key_z2 - flare0) / T50 - 1.4]];   // [height, inner r, outer r]


module body() {
    difference() {
        rotate_extrude() polygon([
            [0, 0], [R, 0], [R, rear_band], [mid_r, rear_band + (R - mid_r)], [mid_r, cav_top], [mid_r, cav_top + taper_delay],
            [waist_r, waist0], [waist_r, flare0], [R, band0], [R, front_top], [0, front_top]]);
        // fin cavity with a 50 deg roof down to the rod bore
        translate([0, 0, base_t]) cylinder(h = cav_top - base_t, r = fc_r);
        translate([0, 0, cav_top - 0.01]) cylinder(h = cone_top - cav_top + 0.02, r1 = fc_r + 0.05, r2 = bore_r);
        // rod bore (starts above the base, so the base stays solid)
        translate([0, 0, base_t]) cylinder(h = front_top + 1, r = bore_r);
        // front scoop: ring cup open to the front, floor sloping outward/down
        translate([0, 0, front_top - scoop_depth])
            rotate_extrude() polygon([[scoop_in_r, scoop_depth * 0.35], [R - scoop_wall, 0],
                                      [R - scoop_wall, scoop_depth + 1], [scoop_in_r, scoop_depth + 1]]);
    }
}

module key(grow = 0) {
    // V ridge on the face y = 0, sticking out toward -y, running radially along +x
    for (k = keys) translate([k[1] - grow, 0, k[0]]) rotate([90, 0, 90])
        linear_extrude(height = k[2] - k[1] + 2 * grow)
            polygon([[grow, -key_h - grow * 1.6], [-key_d - grow, 0], [grow, key_h + grow * 1.6]]);
}

module petal(i = 0) {
    a0 = 360 / n_petals * i;
    difference() {
        union() {
            intersection() {
                body();
                rotate([0, 0, a0]) linear_extrude(height = front_top + 1)
                    polygon([[0, 0], [2 * R, 0], [2 * R * cos(360 / n_petals), 2 * R * sin(360 / n_petals)]]);
            }
            rotate([0, 0, a0]) key(0);                               // ridges on the start face
        }
        rotate([0, 0, a0 + 360 / n_petals]) key(key_clr);            // grooves on the end face
    }
}

module flechette() {
    color("silver") translate([0, 0, base_t + tail_floor]) cylinder(h = rod_len, d = rod_d);
}

if (part == "petal") petal(0);
else if (part == "all") for (i = [0 : n_petals - 1]) petal(i);
else if (part == "open") for (i = [0 : n_petals - 1])
    rotate([0, 0, 360 / n_petals * (i + 0.5)]) translate([14, 0, 0]) rotate([0, 0, -360 / n_petals * (i + 0.5)]) petal(i);
else { for (i = [0 : n_petals - 1]) petal(i); flechette(); }
